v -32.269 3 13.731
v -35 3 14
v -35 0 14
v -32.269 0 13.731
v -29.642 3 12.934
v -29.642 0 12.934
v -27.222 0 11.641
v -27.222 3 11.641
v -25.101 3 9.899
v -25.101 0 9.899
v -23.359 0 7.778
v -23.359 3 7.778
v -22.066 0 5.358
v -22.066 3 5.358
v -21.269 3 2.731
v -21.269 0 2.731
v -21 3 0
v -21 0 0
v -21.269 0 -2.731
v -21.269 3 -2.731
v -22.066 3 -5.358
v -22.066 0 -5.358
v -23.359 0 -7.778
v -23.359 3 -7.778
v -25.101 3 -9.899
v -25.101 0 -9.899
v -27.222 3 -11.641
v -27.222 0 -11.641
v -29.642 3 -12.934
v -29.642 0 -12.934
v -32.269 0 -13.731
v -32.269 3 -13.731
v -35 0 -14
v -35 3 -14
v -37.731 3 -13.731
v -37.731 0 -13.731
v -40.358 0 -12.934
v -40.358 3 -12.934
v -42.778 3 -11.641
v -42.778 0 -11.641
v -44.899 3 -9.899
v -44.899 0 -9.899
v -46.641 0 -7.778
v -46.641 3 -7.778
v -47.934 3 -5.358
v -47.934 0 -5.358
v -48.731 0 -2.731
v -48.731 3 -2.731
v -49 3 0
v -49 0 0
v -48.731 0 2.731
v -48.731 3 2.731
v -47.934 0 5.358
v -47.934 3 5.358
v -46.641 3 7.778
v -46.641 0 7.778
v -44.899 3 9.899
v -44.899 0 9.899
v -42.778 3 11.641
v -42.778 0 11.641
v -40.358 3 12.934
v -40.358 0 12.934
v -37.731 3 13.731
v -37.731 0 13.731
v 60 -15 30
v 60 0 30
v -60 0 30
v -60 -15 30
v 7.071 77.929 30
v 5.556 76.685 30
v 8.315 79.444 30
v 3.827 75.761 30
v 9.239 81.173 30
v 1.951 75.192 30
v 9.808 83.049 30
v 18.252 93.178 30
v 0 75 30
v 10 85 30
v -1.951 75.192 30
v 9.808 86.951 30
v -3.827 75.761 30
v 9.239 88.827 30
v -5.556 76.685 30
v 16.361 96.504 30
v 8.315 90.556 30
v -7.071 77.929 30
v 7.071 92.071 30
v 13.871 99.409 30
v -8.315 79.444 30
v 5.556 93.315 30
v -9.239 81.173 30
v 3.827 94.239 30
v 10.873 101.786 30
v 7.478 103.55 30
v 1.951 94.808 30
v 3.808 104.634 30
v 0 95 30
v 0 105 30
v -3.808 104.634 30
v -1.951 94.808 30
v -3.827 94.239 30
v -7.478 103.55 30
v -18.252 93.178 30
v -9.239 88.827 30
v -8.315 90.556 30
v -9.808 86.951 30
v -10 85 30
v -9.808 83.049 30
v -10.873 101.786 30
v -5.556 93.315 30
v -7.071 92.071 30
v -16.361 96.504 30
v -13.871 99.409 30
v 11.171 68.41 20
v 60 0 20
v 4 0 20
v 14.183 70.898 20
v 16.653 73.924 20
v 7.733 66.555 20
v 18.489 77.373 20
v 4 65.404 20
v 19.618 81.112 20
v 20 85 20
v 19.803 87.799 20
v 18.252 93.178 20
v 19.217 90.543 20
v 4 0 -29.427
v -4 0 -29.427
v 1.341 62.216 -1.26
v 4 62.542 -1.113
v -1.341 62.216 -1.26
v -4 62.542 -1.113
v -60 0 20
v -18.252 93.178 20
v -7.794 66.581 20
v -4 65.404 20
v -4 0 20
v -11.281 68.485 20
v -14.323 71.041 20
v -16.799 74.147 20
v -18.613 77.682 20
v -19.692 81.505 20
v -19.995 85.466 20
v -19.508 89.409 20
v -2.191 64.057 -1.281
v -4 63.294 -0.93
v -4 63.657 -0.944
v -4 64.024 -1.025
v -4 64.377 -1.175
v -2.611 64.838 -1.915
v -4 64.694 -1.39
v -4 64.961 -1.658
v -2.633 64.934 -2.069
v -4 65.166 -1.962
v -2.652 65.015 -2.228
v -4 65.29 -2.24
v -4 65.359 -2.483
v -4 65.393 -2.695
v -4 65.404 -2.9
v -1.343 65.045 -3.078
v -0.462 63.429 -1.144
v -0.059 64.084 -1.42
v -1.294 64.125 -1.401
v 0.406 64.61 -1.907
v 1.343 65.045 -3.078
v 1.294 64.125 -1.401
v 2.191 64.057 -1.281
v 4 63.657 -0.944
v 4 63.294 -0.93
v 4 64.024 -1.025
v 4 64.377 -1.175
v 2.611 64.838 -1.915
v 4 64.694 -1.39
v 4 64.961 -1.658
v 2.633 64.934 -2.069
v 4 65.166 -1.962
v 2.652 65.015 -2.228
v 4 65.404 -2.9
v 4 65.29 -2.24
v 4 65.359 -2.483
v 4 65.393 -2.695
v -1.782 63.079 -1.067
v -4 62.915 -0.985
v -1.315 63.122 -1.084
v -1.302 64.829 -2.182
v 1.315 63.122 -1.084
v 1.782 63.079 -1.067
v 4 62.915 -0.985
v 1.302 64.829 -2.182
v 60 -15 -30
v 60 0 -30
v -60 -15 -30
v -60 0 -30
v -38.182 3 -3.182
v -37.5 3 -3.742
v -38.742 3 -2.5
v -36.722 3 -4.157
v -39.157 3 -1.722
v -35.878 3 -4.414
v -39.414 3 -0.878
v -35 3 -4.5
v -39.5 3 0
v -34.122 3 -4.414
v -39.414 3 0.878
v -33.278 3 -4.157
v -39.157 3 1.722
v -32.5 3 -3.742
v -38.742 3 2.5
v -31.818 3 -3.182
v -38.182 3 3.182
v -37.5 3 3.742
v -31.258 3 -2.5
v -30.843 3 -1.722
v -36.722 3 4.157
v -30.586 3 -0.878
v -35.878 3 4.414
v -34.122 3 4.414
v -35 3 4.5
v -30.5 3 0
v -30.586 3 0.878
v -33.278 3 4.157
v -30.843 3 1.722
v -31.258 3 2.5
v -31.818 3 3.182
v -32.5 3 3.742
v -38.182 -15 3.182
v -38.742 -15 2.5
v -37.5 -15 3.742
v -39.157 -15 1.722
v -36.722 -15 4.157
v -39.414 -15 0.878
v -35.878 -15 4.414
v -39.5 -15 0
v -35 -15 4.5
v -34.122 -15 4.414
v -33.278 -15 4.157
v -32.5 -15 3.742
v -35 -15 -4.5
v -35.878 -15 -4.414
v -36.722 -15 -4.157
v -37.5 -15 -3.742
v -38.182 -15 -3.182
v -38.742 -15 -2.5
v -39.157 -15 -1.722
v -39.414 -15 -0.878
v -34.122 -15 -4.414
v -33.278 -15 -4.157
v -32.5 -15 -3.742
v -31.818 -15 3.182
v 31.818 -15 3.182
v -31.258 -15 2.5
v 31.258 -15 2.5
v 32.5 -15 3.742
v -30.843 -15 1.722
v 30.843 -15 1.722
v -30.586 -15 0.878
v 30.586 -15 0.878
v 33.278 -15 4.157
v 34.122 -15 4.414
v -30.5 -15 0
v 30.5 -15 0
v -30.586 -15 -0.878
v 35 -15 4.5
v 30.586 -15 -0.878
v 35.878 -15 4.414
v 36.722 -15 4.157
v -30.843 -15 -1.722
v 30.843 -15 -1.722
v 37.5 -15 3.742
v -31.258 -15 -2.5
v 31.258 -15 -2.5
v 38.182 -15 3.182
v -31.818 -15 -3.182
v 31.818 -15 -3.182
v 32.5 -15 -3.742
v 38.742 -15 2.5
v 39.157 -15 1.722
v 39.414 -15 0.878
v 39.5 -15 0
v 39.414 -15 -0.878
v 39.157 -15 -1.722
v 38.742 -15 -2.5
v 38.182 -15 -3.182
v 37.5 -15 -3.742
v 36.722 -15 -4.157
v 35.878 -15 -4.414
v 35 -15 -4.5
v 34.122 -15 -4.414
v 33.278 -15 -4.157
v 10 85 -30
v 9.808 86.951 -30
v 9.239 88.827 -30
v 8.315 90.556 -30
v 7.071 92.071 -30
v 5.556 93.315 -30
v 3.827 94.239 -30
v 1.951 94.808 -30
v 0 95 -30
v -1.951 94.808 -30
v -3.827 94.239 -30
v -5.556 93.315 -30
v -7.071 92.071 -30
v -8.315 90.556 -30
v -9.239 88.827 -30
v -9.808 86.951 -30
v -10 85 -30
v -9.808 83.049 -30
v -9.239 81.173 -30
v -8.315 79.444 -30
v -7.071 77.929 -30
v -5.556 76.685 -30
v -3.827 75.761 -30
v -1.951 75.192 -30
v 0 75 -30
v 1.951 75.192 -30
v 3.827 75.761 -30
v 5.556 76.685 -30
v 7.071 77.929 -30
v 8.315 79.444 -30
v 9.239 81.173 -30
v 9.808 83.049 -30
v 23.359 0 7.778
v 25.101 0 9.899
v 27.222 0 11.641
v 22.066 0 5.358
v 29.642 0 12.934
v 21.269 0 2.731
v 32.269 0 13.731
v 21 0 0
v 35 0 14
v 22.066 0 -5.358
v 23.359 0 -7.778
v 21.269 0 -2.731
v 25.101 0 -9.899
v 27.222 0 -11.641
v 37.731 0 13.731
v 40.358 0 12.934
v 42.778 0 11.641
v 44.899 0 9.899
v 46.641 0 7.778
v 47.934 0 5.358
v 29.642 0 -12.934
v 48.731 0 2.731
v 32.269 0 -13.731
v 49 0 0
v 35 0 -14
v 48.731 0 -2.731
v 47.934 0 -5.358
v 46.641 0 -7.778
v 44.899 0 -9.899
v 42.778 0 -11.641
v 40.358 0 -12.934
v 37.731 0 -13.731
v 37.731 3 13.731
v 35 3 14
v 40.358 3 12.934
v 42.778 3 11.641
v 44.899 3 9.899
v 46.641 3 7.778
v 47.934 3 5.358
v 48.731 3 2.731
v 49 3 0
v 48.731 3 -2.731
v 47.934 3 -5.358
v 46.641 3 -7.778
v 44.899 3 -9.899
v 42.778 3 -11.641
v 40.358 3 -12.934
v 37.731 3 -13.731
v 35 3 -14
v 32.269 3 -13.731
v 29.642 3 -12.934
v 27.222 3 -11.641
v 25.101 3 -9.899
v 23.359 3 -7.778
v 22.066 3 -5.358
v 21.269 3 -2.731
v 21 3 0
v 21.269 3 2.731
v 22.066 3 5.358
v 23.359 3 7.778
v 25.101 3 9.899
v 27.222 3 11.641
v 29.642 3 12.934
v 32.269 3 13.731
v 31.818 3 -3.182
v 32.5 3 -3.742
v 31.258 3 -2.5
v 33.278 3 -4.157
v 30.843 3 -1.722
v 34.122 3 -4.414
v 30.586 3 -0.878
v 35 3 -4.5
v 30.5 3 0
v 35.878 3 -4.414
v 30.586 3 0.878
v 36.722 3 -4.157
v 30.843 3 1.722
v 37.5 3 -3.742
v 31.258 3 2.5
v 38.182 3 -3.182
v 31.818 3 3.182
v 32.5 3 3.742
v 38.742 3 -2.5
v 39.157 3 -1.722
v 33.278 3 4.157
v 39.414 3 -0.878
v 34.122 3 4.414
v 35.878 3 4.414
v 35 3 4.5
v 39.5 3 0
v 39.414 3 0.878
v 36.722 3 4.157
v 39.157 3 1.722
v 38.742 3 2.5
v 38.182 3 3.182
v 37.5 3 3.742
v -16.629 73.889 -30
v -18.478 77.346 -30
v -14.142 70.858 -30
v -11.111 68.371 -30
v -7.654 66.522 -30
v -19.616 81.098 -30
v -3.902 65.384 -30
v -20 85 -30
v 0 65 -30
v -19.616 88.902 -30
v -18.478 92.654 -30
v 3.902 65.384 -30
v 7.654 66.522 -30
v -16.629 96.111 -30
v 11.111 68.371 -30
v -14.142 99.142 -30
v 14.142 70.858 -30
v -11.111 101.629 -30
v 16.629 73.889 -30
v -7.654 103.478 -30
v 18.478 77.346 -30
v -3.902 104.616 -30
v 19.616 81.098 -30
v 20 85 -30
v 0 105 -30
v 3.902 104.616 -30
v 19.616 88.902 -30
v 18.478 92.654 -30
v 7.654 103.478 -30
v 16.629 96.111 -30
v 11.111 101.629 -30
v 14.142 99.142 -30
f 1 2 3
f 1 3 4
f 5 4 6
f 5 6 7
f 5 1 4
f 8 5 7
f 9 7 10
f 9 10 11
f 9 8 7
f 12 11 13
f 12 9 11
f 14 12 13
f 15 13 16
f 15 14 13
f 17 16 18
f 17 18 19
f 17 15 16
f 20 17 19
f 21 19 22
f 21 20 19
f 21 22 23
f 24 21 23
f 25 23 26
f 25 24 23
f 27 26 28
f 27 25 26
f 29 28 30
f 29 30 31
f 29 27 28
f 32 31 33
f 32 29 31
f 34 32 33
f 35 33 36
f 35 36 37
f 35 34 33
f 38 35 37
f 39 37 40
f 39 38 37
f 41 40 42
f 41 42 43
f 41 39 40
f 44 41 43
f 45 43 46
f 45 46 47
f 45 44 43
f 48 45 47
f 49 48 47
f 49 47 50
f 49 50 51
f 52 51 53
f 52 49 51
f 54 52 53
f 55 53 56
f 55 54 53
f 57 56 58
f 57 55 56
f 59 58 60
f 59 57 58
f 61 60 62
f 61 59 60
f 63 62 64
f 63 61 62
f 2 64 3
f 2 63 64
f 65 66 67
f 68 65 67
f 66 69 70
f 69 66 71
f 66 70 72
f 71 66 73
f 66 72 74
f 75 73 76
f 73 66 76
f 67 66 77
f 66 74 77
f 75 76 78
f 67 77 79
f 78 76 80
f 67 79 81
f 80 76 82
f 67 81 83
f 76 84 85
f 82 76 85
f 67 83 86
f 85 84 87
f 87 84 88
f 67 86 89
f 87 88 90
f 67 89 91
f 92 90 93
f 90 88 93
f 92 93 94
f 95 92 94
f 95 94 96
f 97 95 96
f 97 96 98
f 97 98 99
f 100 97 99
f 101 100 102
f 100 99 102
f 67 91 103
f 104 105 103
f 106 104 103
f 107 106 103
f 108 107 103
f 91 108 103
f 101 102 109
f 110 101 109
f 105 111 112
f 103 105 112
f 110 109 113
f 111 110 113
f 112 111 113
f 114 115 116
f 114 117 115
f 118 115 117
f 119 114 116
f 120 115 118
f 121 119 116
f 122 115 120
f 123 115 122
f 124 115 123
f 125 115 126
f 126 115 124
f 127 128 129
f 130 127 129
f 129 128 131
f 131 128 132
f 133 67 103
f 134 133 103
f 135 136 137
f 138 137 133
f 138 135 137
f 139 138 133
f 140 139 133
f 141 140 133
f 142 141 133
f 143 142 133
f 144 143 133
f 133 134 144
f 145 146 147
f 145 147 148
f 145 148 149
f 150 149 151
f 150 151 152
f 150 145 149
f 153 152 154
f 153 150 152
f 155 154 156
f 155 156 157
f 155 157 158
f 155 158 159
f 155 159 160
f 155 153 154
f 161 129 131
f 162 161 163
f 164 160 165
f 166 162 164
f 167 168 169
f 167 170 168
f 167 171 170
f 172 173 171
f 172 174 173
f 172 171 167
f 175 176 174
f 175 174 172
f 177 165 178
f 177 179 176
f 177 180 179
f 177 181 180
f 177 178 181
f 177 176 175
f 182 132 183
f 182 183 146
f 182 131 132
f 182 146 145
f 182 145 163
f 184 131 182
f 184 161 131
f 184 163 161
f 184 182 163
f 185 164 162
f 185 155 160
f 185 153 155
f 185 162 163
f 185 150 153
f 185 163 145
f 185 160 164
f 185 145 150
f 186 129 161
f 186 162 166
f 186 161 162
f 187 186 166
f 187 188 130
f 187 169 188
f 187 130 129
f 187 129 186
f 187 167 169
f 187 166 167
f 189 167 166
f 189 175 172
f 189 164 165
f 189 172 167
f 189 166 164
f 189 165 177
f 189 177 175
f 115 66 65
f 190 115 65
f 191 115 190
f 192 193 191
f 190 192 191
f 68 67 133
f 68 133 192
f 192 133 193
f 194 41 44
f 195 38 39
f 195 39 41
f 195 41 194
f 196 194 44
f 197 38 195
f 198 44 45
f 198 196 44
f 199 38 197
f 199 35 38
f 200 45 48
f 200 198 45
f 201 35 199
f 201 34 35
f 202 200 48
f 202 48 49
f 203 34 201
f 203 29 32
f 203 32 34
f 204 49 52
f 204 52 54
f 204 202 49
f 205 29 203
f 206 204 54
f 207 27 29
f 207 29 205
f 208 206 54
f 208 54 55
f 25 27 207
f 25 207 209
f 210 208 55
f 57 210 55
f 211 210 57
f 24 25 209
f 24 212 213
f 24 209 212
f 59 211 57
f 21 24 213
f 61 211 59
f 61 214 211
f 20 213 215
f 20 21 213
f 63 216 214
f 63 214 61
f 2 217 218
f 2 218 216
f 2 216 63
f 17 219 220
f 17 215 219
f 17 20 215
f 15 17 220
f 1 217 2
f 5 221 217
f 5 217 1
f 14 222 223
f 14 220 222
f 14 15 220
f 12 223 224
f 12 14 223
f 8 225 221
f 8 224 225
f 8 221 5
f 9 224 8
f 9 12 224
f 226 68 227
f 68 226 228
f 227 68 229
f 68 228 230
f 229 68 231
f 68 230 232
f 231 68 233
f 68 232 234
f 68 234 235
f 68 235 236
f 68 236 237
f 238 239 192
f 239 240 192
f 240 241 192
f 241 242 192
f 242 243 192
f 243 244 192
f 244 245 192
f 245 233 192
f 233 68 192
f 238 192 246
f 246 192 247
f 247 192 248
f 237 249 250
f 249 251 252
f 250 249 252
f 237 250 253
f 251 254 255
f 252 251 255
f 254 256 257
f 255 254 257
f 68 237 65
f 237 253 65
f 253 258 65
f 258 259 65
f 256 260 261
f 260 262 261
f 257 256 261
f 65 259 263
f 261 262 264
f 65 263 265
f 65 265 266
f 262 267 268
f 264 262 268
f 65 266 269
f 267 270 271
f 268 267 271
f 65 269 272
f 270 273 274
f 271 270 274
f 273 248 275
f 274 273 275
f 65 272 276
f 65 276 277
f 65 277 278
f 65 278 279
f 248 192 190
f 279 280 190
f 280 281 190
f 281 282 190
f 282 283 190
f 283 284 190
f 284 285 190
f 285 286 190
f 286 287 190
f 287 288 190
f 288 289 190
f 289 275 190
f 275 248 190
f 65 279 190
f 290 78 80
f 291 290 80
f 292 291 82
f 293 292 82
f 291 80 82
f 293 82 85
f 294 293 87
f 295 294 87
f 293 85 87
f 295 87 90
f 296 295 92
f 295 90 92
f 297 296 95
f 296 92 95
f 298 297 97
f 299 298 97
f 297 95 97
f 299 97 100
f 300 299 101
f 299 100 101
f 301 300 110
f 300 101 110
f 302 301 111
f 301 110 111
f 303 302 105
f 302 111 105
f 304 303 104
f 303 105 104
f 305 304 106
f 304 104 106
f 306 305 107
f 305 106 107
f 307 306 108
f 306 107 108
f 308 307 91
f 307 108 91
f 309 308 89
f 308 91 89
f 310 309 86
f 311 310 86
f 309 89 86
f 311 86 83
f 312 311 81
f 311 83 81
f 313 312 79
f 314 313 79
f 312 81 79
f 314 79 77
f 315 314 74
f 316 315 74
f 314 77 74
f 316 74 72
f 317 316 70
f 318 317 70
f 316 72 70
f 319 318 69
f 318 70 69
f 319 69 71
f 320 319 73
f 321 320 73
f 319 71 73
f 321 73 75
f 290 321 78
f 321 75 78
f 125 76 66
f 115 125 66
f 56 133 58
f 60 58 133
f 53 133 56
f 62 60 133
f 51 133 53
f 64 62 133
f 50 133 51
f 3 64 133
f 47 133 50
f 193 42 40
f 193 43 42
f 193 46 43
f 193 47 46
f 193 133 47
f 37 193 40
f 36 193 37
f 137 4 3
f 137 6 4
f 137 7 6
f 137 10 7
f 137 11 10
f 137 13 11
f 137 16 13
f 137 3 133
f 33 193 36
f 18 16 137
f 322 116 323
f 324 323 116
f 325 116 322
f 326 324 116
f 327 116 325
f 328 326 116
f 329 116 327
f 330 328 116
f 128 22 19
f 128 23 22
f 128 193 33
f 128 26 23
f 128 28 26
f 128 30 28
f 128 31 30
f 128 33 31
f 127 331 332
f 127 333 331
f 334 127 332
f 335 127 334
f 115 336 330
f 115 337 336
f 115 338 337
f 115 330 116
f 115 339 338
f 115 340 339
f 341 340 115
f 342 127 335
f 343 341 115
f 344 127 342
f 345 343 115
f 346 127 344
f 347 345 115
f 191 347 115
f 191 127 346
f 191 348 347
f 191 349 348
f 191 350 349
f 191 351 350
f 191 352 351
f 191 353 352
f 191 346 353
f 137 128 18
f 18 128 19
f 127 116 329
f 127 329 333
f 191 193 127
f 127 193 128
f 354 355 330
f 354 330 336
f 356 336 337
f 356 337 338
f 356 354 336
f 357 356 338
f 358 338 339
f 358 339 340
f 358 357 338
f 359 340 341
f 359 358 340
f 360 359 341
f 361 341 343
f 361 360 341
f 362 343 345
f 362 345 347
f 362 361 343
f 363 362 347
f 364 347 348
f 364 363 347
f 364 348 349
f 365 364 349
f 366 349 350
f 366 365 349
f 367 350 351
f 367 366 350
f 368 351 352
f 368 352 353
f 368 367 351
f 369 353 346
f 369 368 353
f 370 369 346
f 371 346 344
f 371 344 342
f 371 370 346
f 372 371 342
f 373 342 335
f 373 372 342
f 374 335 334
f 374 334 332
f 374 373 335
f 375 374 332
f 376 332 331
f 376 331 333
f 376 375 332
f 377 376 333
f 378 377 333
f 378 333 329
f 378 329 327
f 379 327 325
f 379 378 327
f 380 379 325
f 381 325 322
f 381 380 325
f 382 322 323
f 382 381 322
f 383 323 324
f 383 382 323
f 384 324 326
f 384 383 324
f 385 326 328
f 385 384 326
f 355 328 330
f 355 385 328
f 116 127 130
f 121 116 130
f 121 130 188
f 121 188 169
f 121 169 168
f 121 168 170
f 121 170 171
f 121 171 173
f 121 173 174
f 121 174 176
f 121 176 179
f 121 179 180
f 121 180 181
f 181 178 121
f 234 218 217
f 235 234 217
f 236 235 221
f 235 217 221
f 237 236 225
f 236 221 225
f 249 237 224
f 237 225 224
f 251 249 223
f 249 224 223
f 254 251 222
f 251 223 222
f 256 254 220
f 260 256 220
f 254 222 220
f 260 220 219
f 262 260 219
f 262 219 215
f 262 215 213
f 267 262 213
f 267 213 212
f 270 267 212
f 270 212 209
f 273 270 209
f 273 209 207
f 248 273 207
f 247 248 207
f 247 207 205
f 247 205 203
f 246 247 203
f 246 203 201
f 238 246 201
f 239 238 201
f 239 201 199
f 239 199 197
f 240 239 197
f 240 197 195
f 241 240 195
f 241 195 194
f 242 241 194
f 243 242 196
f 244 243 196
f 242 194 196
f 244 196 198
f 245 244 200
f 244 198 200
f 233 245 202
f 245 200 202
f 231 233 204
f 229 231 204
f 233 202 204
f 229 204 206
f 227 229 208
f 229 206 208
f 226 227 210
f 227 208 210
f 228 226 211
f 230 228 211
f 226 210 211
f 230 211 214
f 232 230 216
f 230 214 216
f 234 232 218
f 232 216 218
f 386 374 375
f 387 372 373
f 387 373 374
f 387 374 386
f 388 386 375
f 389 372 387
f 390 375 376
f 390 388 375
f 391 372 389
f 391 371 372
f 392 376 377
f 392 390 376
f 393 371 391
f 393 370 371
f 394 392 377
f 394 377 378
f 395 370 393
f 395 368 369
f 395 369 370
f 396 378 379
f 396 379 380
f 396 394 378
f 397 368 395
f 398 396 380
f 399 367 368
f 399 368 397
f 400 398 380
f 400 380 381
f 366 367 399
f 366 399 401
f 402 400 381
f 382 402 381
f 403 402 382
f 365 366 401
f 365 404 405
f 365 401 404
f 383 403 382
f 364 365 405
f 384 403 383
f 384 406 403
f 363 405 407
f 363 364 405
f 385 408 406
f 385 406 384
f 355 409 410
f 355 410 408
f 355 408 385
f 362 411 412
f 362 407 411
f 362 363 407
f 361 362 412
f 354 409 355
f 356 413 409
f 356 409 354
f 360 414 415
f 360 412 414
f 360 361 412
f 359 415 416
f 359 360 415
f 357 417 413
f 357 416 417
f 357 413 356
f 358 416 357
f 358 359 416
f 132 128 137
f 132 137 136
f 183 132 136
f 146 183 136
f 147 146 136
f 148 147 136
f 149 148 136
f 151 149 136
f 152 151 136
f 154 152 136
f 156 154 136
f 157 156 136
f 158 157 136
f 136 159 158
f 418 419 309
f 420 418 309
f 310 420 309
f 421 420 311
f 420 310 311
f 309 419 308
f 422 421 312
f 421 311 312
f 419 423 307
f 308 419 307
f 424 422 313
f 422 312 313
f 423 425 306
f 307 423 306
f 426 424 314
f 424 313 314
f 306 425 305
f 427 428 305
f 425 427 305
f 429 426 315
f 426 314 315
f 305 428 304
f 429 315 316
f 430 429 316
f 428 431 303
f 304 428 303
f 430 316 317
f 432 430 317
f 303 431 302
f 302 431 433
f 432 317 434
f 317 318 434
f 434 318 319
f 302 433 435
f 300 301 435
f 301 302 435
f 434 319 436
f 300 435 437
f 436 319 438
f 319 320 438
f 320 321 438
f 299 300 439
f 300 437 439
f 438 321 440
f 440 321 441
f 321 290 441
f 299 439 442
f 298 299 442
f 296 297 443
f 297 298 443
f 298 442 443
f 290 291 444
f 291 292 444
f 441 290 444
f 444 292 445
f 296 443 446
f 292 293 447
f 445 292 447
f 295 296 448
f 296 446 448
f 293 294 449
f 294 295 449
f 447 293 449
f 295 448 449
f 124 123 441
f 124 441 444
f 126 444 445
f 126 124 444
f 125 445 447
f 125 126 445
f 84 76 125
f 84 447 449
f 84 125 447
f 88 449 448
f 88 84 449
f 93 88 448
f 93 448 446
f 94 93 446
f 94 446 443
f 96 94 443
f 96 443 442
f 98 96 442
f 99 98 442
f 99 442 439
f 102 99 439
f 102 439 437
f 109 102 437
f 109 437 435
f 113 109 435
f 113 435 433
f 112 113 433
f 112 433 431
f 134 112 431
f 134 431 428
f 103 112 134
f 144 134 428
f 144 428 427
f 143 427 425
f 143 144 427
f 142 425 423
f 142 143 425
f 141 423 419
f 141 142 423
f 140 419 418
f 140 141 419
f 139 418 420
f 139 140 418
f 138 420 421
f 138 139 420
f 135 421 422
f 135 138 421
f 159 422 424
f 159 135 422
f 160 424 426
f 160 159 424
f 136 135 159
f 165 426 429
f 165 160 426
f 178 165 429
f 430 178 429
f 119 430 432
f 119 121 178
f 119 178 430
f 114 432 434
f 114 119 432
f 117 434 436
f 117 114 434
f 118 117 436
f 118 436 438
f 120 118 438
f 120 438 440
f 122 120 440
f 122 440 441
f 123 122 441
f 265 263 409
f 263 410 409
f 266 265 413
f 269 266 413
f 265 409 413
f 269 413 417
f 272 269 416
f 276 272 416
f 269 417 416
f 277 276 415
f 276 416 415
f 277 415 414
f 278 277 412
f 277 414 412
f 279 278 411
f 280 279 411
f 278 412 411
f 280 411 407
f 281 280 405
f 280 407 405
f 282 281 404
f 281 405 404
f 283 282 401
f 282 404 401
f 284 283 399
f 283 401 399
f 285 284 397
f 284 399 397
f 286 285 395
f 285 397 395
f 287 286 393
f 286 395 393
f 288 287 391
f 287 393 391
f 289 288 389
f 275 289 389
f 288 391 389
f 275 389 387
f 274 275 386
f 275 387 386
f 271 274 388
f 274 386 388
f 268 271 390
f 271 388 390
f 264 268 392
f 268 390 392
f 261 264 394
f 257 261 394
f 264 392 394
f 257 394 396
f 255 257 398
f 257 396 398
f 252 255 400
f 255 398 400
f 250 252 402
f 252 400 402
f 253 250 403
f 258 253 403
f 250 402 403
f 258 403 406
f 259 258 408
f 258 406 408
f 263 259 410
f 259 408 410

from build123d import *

# Parameters (mm, degrees)
SKETCH1_W           = 120
SKETCH1_H           = 60
SKETCH1_R           = 4.5
BOSS_EXTRUDE1_DEPTH = 15
SKETCH2_R           = 20
SKETCH2_R_2         = 10
BOSS_EXTRUDE2_DEPTH = 60
BOSS_EXTRUDE3_DEPTH = 10
BOSS_EXTRUDE4_START = 3
SKETCH11_R          = 14
SKETCH11_R_2        = 4.5
BOSS_EXTRUDE4_DEPTH = 3
RIB1_REACH          = 126.599
SKETCH13_WALL_W     = 322.54976404
SKETCH13_WALL_H     = 8
FILLET1_R           = 2


with BuildPart() as part:
    # Sketch1 → Boss-Extrude1 (new body)
    with BuildSketch(Plane(origin=(0, 0, 0), x_dir=(1, 0, 0), z_dir=(0, 1, 0))):
        Rectangle(SKETCH1_W, SKETCH1_H)
        with Locations(Location((-35, 0, 0), (0, 0, 270))):
            Circle(SKETCH1_R, mode=Mode.SUBTRACT)
        with Locations(Location((35, 0, 0), (0, 0, 270))):
            Circle(SKETCH1_R, mode=Mode.SUBTRACT)
    extrude(amount=-BOSS_EXTRUDE1_DEPTH)



with BuildPart() as body_2:
    # Sketch2 → Boss-Extrude2 (new body)
    with BuildSketch(Plane.XY.offset(30)):
        with Locations((0, 85)):
            Circle(SKETCH2_R)
        with Locations((0, 85)):
            Circle(SKETCH2_R_2, mode=Mode.SUBTRACT)
    extrude(amount=-BOSS_EXTRUDE2_DEPTH)


with BuildPart() as part_1:
    add(part.part)

    add(body_2.part)  # Boss-Extrude3 merges body 2
    # Sketch3 → Boss-Extrude3 (add)
    with BuildSketch(Plane.XY.offset(30)):
        with BuildLine():
            Line((-60, 0), (-18.251723952, 93.177687496))
            ThreePointArc((-18.251723952, 93.177687496), (0, 65), (18.251723952, 93.177687496))
            Line((18.251723952, 93.177687496), (60, 0))
            Line((60, 0), (-60, 0))
        make_face()
    extrude(amount=-BOSS_EXTRUDE3_DEPTH)

    # Sketch11 → Boss-Extrude4 (add)
    # profile 1 of 2: a face of its own
    with BuildSketch(Plane(origin=(0, 0, 0), x_dir=(1, 0, 0), z_dir=(0, 1, 0)).offset(BOSS_EXTRUDE4_START)):
        with Locations(Location((-35, 0, 0), (0, 0, 270))):
            Circle(SKETCH11_R)
        with Locations(Location((-35, 0, 0), (0, 0, 270))):
            Circle(SKETCH11_R_2, mode=Mode.SUBTRACT)
    # profile 2 of 2: a face of its own
    with BuildSketch(Plane(origin=(0, 0, 0), x_dir=(1, 0, 0), z_dir=(0, 1, 0)).offset(BOSS_EXTRUDE4_START)):
        with Locations(Location((35, 0, 0), (0, 0, 270))):
            Circle(SKETCH11_R)
        with Locations(Location((35, 0, 0), (0, 0, 270))):
            Circle(SKETCH11_R_2, mode=Mode.SUBTRACT)
    extrude(amount=-BOSS_EXTRUDE4_DEPTH)

    # Sketch13 wall → Rib1 (add, up to next)
    with BuildSketch(Plane(origin=(0, 32.5, -14.713701713), x_dir=(0, 0.910988719631, 0.41243127028), z_dir=(0, -0.41243127028, 0.910988719631)), mode=Mode.PRIVATE) as rib1_sk1:
        Rectangle(SKETCH13_WALL_W, SKETCH13_WALL_H)
    rib1_tool1 = extrude(rib1_sk1.sketch, amount=RIB1_REACH, mode=Mode.PRIVATE) - part_1.part
    add(rib1_tool1.solids().sort_by_distance((0, 32.5, -14.713701713))[0])

    # Fillet1
    fillet1_edges = [part_1.edges().sort_by_distance(p)[0] for p in [
        (0, 65, -1e-09),
    ]]
    fillet(fillet1_edges, radius=FILLET1_R)


solid = part_1.part
